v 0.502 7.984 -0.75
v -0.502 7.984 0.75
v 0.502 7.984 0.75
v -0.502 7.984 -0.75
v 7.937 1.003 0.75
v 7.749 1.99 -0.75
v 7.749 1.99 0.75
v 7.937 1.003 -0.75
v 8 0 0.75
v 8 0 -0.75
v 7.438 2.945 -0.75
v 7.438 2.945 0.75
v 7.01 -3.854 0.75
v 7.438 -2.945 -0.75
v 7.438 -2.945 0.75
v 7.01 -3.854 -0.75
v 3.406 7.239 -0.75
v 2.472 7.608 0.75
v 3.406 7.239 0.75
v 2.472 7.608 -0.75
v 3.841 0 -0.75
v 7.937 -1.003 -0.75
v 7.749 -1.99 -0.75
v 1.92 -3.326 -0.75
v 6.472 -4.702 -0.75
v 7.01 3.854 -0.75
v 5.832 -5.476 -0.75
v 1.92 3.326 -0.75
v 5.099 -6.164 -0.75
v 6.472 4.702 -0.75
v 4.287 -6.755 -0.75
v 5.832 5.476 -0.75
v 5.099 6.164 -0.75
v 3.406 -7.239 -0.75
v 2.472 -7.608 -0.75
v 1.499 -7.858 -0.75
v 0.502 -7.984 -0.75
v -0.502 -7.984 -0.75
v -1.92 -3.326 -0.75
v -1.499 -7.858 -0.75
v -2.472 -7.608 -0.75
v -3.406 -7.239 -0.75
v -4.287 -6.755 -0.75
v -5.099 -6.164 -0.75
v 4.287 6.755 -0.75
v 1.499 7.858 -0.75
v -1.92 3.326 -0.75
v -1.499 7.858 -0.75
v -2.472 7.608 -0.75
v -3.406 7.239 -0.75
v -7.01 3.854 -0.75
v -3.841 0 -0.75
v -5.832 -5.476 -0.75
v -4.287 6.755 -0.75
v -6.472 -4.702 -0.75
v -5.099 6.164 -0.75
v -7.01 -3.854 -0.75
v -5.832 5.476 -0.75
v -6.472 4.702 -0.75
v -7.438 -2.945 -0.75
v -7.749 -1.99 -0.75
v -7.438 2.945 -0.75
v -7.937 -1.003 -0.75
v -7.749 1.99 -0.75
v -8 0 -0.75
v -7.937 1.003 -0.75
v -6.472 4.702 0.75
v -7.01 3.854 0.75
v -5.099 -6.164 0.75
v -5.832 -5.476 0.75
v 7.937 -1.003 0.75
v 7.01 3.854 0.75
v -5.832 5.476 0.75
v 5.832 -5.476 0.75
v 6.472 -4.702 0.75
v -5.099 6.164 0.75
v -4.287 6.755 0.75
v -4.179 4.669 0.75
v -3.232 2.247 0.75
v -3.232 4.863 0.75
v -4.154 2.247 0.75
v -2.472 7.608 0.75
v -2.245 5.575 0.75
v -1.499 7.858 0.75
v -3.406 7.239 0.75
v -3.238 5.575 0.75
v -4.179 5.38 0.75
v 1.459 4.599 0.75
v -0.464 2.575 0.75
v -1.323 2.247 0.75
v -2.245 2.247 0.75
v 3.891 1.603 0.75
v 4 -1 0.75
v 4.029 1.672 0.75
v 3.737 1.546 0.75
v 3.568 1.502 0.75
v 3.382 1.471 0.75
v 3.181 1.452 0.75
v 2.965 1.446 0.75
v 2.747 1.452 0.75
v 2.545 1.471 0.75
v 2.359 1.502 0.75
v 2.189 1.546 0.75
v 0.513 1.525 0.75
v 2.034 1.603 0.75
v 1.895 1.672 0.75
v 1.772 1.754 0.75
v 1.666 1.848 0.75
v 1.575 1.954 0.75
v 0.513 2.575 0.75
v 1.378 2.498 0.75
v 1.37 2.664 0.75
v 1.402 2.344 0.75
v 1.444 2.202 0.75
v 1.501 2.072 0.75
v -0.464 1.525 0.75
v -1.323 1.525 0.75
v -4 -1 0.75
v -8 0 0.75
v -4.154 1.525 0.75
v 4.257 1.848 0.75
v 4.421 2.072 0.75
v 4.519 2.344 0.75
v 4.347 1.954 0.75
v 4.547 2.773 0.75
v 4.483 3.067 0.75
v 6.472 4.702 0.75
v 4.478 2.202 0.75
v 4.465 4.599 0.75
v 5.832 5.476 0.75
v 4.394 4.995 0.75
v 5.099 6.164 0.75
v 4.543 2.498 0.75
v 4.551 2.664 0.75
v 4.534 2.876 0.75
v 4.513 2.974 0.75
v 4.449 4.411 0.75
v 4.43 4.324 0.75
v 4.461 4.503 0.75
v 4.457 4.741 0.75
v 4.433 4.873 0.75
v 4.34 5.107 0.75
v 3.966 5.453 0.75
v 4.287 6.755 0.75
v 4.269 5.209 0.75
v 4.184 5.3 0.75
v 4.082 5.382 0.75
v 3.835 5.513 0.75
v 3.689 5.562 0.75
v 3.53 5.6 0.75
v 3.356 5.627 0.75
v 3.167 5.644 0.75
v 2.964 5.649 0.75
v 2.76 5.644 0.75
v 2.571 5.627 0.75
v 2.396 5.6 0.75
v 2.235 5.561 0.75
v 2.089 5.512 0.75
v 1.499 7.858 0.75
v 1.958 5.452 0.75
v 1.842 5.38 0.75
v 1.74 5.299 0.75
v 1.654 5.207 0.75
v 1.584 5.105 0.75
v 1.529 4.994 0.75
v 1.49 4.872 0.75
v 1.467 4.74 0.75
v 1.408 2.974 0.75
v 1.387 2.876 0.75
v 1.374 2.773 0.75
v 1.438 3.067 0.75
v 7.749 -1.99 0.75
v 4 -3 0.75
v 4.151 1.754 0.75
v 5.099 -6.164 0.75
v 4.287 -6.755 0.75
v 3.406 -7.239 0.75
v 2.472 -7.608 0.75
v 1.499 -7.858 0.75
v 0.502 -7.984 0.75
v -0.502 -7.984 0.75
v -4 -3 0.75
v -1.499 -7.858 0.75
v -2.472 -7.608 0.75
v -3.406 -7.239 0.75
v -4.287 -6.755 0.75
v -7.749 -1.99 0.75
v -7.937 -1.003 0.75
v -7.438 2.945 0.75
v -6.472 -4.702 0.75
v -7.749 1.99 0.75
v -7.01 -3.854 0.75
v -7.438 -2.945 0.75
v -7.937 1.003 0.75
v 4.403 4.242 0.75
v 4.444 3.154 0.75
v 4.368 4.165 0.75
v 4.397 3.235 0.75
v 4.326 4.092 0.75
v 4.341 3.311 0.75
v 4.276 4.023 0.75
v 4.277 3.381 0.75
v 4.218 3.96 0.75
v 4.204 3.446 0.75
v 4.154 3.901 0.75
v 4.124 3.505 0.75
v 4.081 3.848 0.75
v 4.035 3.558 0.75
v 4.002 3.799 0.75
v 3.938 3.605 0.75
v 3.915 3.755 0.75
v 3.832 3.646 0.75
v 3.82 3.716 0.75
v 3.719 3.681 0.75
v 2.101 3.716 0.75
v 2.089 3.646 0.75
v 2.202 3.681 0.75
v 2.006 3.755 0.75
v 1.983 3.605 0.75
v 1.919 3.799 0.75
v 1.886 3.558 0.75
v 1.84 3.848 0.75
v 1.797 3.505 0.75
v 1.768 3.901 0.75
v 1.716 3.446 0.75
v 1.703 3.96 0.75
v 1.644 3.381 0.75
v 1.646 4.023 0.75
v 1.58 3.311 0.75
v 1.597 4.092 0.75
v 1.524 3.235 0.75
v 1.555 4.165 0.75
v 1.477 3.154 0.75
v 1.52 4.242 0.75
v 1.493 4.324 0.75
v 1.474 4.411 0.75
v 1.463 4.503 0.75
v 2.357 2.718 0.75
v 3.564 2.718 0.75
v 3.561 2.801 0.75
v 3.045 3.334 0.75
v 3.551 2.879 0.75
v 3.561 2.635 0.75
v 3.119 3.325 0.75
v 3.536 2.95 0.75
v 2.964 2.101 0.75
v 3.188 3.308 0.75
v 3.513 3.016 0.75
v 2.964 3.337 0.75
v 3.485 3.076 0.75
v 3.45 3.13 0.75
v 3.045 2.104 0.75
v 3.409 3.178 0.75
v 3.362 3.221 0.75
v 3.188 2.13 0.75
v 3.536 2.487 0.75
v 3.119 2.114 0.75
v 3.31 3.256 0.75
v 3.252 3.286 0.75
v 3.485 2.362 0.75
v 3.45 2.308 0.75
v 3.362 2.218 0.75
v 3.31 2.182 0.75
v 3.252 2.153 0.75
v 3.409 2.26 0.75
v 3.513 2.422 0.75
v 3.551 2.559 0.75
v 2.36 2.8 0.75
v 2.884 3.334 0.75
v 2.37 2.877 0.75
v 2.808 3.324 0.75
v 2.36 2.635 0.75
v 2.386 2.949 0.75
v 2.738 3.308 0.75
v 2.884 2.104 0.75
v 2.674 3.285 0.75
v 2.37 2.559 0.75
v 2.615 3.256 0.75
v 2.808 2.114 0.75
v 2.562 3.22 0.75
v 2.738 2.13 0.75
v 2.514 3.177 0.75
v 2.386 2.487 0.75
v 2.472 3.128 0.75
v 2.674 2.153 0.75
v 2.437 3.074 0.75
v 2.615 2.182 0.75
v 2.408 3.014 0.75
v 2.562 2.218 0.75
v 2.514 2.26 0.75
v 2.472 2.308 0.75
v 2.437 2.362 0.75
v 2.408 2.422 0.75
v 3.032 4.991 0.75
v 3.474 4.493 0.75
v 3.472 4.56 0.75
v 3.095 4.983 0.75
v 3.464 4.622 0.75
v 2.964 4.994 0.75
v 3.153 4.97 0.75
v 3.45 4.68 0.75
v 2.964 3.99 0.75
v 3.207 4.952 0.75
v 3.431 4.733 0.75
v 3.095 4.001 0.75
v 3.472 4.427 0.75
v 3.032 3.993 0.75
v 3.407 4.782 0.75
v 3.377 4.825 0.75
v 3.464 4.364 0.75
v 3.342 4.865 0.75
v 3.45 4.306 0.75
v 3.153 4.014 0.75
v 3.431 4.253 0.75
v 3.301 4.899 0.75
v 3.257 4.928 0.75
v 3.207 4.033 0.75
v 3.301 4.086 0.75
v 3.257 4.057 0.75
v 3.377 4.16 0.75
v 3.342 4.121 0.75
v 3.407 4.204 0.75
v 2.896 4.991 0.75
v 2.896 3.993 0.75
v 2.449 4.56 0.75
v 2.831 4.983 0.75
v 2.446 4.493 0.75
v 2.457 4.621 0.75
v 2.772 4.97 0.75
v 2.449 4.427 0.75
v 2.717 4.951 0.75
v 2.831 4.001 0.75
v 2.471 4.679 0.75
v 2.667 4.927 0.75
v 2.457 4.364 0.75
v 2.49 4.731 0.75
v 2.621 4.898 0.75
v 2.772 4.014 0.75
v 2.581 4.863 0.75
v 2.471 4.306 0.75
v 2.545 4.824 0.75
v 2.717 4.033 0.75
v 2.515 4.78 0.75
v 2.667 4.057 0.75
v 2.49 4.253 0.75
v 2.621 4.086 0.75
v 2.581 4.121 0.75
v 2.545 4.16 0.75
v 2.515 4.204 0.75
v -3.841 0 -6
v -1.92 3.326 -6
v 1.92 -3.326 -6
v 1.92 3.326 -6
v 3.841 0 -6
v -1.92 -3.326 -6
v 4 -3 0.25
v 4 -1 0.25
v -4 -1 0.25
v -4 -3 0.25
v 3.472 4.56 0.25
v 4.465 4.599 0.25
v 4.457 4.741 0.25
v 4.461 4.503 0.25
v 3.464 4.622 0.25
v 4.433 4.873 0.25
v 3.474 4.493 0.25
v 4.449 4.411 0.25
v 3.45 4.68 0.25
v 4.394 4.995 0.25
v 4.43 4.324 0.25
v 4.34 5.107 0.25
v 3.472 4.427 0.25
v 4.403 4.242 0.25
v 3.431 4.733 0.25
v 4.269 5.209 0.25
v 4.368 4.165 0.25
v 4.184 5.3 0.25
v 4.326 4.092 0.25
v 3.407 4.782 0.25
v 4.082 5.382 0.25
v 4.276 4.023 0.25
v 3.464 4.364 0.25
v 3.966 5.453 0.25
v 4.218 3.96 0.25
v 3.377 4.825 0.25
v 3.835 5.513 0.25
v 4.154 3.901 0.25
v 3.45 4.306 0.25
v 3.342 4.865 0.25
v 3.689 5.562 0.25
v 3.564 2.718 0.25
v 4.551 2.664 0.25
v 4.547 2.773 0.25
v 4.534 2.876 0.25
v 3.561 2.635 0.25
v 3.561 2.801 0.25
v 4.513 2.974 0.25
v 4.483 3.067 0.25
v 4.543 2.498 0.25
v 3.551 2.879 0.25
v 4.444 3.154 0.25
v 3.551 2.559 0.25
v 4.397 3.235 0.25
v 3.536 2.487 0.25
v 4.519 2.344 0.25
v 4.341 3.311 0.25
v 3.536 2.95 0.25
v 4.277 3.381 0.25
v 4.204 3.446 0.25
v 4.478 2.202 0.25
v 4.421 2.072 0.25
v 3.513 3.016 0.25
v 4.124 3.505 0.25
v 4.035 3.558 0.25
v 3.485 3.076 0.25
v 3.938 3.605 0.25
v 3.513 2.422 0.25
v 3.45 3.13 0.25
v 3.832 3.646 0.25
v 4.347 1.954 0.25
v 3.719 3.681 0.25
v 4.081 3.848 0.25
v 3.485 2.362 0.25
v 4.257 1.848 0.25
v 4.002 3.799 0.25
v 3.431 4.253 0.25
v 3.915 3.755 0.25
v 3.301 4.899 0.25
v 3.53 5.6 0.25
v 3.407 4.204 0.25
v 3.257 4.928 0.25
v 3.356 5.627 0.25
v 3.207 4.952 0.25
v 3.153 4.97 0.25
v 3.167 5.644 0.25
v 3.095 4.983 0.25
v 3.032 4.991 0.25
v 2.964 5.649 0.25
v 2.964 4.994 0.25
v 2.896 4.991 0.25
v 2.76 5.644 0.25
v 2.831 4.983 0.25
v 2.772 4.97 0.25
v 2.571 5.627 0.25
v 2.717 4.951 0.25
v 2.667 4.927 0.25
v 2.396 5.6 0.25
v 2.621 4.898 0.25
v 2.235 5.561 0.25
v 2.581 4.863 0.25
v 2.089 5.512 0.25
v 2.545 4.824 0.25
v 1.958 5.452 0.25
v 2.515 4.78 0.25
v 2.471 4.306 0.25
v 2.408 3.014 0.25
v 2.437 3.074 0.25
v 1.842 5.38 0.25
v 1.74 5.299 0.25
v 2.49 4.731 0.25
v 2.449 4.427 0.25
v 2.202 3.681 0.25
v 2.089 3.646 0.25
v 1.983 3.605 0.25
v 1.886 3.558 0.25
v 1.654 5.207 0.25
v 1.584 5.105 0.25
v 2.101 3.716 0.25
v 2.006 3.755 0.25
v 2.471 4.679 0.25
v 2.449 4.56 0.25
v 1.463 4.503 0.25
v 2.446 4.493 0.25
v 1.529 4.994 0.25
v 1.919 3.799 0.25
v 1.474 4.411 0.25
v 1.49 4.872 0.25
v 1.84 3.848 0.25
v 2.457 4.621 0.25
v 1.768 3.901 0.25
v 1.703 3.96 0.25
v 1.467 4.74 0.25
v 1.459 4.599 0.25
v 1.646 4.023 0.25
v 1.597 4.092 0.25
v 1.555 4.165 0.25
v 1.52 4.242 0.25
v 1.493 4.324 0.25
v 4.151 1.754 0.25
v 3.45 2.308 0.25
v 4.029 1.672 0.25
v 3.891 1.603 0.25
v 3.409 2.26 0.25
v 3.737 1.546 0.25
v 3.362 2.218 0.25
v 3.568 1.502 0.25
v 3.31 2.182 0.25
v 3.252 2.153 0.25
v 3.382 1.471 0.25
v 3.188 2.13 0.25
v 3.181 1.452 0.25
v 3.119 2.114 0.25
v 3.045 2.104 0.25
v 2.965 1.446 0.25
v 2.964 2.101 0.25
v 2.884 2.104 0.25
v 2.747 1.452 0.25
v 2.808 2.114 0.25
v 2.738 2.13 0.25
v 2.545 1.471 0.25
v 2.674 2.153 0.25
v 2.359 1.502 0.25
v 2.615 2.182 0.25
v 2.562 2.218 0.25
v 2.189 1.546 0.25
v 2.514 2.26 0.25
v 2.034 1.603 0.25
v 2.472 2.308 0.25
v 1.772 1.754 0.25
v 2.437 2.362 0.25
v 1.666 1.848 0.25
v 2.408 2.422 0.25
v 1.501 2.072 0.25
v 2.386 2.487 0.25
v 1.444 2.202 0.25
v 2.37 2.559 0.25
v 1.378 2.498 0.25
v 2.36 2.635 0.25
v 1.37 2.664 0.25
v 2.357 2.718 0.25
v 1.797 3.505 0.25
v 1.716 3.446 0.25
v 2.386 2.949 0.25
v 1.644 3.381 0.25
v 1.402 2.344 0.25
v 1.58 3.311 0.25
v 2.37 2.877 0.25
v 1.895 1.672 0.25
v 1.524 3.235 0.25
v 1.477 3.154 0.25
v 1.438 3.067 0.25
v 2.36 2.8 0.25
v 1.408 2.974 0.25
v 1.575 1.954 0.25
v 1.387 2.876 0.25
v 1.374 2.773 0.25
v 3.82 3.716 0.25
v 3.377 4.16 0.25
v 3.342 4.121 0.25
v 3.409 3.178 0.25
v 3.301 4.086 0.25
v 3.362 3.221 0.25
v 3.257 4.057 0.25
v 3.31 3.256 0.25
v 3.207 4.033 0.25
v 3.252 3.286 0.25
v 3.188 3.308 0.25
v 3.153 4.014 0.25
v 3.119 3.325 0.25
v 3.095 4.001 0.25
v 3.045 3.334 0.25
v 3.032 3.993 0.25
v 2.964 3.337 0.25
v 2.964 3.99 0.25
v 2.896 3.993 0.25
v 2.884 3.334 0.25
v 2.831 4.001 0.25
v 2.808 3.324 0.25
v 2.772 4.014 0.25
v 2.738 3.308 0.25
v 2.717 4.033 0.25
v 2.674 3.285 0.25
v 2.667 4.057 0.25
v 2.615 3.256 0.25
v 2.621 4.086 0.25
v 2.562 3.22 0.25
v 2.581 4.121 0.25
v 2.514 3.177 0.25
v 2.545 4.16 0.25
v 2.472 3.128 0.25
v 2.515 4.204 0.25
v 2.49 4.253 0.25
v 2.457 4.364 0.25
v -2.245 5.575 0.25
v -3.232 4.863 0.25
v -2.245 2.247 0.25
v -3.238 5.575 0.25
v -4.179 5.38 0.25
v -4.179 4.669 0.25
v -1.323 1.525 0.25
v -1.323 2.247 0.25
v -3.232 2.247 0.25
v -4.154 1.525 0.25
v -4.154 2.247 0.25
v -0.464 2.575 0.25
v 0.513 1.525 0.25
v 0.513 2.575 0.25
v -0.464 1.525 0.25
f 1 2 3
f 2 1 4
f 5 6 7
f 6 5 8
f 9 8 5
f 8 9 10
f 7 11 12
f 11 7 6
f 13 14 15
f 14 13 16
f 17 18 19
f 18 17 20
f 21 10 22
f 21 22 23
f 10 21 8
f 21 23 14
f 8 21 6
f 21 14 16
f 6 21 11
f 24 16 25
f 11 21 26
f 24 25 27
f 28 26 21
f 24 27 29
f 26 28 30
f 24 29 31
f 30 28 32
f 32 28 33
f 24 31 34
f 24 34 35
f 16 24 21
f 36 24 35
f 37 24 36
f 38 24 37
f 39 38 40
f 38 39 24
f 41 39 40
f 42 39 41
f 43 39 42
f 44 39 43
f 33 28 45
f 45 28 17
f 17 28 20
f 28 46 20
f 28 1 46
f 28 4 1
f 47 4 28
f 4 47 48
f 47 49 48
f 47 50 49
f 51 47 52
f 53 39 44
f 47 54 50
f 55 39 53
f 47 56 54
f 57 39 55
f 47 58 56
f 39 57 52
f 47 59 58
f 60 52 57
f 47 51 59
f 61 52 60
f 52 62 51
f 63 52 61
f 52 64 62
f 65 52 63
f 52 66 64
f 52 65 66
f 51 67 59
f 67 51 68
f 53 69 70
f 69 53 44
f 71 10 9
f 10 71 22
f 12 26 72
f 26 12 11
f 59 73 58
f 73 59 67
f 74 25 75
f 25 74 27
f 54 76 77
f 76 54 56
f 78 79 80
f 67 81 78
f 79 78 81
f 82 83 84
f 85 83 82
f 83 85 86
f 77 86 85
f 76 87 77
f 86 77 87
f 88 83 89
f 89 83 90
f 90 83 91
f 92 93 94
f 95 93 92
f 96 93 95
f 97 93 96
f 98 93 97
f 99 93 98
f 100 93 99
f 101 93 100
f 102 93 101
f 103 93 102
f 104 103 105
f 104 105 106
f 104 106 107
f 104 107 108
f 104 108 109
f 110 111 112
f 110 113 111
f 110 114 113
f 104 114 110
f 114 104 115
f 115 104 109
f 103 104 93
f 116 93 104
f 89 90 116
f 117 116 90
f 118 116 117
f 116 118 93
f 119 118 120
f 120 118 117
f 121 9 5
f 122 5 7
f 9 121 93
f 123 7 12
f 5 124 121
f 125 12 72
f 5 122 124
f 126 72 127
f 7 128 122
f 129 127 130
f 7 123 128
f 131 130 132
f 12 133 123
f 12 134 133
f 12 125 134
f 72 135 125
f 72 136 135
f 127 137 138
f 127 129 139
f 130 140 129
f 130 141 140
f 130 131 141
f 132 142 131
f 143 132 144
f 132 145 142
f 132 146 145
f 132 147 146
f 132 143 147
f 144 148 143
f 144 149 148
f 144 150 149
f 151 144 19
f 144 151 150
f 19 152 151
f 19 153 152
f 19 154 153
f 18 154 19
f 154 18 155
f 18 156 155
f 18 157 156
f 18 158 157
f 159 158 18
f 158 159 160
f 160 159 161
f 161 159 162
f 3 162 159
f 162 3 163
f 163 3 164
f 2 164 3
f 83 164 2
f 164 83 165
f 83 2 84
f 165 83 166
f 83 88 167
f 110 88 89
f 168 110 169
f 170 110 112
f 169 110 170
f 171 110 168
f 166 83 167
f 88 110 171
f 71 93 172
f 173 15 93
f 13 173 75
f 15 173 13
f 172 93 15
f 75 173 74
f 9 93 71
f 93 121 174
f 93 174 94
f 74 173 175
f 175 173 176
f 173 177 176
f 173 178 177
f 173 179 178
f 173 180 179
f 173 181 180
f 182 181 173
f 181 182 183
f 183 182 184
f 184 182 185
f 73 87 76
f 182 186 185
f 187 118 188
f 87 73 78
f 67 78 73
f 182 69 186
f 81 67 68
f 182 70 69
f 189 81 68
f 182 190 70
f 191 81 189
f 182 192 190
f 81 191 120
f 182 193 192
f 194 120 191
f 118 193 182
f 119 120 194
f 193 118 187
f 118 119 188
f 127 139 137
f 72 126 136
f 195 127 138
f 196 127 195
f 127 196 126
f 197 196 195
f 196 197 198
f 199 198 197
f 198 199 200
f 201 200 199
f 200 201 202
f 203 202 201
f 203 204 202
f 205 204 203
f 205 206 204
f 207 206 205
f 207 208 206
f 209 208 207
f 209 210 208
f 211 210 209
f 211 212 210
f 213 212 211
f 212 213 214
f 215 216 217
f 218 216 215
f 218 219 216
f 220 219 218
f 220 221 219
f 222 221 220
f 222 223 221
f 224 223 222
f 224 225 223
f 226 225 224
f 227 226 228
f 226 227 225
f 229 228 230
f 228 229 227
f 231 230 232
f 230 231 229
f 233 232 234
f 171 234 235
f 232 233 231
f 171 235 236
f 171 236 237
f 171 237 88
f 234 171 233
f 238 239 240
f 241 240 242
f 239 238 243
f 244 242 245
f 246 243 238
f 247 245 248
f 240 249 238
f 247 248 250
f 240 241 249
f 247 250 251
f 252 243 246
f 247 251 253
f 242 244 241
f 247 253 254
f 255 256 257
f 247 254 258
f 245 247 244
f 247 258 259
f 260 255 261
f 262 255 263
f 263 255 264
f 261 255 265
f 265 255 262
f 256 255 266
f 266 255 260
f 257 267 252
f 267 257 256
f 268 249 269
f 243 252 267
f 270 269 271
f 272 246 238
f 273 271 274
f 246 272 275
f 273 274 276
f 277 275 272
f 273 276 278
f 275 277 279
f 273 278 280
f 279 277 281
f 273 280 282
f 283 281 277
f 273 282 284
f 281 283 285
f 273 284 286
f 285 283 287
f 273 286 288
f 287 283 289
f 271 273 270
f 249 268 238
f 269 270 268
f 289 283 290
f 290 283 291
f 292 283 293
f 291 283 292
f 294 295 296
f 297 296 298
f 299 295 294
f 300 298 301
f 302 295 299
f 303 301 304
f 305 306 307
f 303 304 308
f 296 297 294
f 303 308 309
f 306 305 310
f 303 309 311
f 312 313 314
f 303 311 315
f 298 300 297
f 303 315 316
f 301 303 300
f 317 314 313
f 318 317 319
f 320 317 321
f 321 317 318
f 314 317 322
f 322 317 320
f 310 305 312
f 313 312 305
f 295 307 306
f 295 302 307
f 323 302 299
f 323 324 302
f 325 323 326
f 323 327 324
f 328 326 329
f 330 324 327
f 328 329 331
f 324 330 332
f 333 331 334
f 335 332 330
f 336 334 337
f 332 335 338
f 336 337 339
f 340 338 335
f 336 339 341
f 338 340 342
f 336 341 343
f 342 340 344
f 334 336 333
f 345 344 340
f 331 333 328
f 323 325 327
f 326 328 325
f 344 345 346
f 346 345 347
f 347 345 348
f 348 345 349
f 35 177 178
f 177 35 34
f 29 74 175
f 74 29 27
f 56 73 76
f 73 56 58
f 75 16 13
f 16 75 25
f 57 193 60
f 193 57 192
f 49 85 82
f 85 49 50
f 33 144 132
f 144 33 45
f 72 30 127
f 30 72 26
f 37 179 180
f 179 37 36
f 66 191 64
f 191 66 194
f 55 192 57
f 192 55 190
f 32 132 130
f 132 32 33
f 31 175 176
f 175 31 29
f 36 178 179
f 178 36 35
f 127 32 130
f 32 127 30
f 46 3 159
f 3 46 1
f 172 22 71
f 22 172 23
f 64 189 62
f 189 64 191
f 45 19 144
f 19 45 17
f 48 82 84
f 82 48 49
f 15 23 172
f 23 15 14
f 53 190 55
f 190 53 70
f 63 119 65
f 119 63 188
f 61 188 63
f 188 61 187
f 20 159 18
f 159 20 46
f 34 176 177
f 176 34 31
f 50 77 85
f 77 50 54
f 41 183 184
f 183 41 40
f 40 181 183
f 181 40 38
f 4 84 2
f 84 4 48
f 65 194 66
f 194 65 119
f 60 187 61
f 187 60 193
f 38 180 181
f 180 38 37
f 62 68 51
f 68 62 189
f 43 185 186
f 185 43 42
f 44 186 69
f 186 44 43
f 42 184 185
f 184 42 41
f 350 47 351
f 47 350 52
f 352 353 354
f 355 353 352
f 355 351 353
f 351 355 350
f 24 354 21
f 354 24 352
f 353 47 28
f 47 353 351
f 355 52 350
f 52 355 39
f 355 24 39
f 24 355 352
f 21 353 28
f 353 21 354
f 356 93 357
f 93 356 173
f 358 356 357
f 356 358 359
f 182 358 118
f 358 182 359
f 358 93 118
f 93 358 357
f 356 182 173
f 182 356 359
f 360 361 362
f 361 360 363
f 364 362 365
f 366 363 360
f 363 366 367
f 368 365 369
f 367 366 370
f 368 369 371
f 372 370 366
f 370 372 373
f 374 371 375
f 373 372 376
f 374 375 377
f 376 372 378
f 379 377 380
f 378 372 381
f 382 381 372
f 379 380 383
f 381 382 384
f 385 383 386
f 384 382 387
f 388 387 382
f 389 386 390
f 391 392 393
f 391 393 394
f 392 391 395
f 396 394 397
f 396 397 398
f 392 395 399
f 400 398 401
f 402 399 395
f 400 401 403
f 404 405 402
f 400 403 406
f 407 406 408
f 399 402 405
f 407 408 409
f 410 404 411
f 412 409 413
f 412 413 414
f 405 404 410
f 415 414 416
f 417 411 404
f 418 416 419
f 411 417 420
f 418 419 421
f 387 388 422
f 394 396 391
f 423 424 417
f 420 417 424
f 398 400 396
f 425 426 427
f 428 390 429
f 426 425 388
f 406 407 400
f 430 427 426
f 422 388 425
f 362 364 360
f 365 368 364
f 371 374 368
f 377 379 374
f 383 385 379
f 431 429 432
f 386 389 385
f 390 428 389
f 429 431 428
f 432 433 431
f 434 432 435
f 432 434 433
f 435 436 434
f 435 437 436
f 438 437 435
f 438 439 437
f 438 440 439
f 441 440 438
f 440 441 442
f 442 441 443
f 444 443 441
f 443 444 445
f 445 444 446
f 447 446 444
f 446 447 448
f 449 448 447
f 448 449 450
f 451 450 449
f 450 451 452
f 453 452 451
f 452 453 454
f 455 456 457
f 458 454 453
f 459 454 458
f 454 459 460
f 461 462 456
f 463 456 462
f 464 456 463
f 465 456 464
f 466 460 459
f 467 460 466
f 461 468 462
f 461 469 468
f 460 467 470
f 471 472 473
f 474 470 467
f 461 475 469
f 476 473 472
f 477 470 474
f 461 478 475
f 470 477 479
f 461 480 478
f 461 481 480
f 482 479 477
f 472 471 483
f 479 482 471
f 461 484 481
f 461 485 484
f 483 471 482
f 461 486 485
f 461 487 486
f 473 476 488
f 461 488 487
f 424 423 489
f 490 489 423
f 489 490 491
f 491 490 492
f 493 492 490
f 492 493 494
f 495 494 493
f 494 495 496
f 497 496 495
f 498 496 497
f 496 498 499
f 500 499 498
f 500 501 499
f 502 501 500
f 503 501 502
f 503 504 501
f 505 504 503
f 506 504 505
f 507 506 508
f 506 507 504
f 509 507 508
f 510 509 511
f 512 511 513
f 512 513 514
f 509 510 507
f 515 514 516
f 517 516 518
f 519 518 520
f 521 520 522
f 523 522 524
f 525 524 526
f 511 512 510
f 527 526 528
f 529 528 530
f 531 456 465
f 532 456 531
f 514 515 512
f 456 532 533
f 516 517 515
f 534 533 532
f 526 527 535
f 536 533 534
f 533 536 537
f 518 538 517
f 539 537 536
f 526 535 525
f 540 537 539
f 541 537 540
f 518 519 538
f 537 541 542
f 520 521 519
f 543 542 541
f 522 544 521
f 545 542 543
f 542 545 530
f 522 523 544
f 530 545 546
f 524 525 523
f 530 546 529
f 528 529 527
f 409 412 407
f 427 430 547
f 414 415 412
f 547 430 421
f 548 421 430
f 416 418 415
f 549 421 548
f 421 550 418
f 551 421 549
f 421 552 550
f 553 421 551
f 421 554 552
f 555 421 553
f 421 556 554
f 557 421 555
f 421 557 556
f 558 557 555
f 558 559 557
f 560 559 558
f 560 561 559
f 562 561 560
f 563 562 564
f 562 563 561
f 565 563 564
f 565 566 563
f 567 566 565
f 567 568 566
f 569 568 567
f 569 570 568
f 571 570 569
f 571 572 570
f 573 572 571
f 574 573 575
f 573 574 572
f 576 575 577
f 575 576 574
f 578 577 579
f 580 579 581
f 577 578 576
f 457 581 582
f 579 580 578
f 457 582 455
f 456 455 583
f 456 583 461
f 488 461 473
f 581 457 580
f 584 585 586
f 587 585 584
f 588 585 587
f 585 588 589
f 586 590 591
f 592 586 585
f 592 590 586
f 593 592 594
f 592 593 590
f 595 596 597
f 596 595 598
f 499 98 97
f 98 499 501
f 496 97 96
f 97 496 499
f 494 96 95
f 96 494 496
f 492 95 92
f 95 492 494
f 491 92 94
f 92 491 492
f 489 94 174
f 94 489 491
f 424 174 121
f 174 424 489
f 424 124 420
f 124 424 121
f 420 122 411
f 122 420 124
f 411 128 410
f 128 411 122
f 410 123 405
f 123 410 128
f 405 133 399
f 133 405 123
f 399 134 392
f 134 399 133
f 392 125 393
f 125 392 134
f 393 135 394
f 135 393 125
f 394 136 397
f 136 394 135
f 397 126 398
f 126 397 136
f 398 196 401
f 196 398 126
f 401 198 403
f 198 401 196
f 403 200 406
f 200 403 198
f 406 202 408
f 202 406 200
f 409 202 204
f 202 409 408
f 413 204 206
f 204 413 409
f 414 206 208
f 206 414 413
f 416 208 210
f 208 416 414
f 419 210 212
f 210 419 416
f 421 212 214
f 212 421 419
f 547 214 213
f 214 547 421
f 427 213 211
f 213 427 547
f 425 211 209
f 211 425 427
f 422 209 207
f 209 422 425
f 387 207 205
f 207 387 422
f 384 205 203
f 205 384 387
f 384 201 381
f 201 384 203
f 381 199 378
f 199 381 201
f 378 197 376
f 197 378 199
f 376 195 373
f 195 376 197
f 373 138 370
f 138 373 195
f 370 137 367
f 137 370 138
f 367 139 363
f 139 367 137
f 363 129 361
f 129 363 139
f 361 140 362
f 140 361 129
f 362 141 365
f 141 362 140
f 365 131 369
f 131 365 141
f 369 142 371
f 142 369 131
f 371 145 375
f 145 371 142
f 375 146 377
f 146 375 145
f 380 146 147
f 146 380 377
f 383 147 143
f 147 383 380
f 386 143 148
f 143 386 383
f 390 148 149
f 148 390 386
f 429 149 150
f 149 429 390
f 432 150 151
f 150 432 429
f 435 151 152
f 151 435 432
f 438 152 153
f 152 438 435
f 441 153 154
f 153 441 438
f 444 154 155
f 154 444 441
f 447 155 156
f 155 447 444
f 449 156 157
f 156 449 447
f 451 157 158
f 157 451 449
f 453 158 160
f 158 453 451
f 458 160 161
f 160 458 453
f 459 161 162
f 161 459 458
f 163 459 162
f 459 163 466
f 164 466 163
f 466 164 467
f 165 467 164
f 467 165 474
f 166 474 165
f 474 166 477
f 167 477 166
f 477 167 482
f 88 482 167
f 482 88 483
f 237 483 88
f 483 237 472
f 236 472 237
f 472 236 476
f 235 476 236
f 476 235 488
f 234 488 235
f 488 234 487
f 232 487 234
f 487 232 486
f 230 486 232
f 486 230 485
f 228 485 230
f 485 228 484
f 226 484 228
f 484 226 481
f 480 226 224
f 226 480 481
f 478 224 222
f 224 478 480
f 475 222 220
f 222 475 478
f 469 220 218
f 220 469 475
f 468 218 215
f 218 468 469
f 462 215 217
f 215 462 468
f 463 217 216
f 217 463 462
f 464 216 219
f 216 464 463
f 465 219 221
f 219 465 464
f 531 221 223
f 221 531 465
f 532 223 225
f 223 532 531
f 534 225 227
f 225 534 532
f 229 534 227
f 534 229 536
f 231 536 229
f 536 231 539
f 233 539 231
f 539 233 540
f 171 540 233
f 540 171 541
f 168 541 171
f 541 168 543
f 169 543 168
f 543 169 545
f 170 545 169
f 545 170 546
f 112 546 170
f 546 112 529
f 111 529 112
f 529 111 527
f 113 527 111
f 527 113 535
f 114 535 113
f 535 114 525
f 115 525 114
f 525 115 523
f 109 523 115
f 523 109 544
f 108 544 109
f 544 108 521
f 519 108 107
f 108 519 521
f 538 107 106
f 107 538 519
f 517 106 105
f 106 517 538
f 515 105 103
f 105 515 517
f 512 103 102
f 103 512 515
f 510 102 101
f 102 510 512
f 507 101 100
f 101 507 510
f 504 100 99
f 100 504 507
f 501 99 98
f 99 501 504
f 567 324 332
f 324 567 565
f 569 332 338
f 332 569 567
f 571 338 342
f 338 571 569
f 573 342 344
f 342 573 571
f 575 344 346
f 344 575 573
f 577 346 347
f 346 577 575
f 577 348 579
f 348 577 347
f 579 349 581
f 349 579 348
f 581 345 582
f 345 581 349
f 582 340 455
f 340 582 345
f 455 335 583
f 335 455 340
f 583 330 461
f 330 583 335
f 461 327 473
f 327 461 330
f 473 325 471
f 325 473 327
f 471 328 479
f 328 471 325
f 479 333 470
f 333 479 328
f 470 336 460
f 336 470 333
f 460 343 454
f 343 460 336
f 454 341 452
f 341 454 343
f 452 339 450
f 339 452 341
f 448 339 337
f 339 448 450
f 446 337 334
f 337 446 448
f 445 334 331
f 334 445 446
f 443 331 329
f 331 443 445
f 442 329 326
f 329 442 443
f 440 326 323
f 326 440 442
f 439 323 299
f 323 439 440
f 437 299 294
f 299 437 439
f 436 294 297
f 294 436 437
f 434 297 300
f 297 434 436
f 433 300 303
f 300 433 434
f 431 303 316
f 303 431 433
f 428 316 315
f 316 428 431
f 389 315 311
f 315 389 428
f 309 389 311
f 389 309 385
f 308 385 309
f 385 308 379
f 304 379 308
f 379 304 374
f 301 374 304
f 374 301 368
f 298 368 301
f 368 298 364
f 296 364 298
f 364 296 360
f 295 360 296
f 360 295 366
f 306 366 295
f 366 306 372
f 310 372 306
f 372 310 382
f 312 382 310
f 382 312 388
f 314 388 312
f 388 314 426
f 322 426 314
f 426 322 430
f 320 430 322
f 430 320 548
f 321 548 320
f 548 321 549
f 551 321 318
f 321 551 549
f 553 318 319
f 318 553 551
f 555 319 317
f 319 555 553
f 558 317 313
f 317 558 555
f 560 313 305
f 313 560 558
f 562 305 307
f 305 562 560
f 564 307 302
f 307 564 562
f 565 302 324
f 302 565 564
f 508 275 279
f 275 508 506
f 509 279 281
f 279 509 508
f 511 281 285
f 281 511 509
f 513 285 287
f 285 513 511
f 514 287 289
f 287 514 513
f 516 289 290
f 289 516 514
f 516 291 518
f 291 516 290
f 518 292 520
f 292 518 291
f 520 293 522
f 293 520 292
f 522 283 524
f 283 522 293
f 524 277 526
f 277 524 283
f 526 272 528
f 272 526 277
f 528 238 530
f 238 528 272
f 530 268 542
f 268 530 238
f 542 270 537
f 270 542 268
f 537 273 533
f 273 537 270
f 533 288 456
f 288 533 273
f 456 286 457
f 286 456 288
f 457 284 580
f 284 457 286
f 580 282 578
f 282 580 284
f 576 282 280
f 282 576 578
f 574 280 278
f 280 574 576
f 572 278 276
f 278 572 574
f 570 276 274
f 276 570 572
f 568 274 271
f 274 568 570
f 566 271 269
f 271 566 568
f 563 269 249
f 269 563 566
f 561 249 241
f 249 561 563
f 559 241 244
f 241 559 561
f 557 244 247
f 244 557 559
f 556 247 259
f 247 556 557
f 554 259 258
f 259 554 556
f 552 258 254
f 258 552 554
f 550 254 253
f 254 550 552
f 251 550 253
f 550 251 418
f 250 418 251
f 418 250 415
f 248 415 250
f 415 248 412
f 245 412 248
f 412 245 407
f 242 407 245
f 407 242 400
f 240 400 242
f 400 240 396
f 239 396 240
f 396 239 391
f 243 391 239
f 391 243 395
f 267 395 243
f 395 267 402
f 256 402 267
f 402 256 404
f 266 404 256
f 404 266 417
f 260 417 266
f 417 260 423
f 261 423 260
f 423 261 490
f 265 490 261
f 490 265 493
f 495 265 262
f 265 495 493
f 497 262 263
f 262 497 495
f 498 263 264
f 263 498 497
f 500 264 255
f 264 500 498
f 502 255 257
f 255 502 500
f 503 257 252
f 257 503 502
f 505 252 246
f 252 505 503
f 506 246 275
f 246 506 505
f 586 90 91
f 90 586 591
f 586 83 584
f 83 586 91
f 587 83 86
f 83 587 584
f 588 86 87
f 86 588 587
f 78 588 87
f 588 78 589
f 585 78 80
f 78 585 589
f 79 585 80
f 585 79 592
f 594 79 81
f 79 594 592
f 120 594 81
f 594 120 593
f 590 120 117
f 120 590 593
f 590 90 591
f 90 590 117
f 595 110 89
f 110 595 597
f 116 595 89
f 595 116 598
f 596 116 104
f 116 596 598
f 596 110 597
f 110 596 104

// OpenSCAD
$fn = 50;


difference() {
	union() {
		translate(v = [0, 0, -0.7500000000]) {
			cylinder(h = 1.5000000000, r = 8.0000000000);
		}
		translate(v = [0, 0, -6]) {
			linear_extrude(height = 6) {
				polygon(points = [[3.8408550000, 0.0000000000], [1.9204275000, 3.3262780023], [-1.9204275000, 3.3262780023], [-3.8408550000, 0.0000000000], [-1.9204275000, -3.3262780023], [1.9204275000, -3.3262780023]]);
			}
		}
	}
	union() {
		#translate(v = [-4.0000000000, -3.0000000000, 0.2500000000]) {
			cube(size = [8, 2, 0.5000000000]);
		}
		#translate(v = [0, 3.5000000000, 0.2500000000]) {
			linear_extrude(height = 0.5000000000) {
				text(font = "SegoiUI:Bold", halign = "center", size = 4, text = "1.8", valign = "center");
			}
		}
	}
}
